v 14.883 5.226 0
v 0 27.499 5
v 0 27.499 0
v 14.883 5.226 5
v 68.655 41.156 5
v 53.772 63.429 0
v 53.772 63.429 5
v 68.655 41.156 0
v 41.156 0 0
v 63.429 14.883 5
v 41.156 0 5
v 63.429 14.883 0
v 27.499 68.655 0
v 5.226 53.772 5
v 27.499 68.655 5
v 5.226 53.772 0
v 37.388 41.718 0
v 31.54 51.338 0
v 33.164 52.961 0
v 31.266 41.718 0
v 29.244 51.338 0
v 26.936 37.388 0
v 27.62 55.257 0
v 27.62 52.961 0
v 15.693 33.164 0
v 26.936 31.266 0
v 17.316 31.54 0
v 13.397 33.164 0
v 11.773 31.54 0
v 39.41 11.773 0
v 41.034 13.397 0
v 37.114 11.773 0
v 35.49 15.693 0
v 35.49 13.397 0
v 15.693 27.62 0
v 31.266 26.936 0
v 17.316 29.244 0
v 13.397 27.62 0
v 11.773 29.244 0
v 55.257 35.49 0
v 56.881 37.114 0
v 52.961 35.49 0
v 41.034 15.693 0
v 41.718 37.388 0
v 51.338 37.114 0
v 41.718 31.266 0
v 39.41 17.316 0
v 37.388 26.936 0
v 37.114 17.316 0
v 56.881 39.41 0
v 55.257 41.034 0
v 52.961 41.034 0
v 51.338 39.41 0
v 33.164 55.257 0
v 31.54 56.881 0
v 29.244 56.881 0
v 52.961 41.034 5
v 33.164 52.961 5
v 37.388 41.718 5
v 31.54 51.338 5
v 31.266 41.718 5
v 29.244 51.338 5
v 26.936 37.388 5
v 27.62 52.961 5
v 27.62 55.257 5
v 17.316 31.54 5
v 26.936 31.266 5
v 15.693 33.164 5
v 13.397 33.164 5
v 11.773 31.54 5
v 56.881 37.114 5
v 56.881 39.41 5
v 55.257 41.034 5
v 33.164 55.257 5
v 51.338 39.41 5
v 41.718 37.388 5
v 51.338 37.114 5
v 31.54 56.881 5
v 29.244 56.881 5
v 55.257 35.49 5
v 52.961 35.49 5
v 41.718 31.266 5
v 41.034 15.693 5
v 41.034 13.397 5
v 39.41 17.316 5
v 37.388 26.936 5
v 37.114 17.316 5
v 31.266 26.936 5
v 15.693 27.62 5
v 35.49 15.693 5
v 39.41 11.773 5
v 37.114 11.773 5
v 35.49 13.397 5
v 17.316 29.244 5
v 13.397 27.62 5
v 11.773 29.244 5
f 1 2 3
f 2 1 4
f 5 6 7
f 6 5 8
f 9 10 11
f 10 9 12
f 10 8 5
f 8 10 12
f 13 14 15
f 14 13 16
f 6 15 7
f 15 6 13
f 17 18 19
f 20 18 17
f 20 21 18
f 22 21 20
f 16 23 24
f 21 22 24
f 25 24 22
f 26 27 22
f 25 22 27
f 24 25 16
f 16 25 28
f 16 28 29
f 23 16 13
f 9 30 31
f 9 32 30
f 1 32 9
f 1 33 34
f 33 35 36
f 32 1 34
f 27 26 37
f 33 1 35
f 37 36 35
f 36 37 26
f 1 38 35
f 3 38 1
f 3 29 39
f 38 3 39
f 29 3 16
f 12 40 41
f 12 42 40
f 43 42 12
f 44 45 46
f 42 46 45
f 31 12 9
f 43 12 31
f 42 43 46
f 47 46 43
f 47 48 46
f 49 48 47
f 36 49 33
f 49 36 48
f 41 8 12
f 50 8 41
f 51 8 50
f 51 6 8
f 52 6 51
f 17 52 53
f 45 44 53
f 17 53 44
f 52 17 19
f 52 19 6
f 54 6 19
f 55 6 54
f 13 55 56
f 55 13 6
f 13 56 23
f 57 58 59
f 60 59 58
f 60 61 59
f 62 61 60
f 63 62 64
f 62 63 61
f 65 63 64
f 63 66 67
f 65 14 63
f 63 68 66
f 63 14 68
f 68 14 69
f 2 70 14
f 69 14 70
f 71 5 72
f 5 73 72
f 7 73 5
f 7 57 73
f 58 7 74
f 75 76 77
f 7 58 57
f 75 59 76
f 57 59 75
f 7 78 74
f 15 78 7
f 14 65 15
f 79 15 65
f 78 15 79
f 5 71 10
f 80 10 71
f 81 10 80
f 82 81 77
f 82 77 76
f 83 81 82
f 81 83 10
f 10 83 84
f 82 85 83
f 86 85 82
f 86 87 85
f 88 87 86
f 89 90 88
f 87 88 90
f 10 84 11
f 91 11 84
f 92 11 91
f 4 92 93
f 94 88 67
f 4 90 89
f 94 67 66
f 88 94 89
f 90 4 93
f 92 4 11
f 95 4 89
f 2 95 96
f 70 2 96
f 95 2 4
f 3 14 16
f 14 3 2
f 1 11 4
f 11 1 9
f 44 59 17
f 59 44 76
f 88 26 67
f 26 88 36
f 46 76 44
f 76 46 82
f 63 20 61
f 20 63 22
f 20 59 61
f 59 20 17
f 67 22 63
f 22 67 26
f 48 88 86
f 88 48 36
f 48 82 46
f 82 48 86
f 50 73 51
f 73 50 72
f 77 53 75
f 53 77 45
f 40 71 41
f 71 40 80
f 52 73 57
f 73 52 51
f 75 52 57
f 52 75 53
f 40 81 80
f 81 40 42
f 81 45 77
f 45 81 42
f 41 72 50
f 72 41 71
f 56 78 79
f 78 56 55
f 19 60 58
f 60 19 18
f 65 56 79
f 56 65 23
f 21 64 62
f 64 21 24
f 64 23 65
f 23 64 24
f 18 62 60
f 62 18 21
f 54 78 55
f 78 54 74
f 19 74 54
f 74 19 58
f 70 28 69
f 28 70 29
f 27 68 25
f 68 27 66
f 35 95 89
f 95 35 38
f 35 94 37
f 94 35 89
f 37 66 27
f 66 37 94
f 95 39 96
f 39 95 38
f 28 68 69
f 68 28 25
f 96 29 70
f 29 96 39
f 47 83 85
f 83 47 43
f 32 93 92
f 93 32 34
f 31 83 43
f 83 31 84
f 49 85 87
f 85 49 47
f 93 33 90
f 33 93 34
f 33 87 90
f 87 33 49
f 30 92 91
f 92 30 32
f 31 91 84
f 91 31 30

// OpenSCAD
$fn = 32;

// ----------------------------------------------------------------------
// Polygon plate: 8-gon R35, 4 bolt windows
// ----------------------------------------------------------------------

// --- parameters (mm) ---
sides = 8;                // number of polygon sides
plate_r = 35;             // circumscribed radius of the polygon
bore_r = 8;               // centre bore radius
bolts = 4;                // number of bolt windows
ring_r = 20.17;           // bolt-circle radius
bolt_r = 3;               // bolt window radius
plate_t = 5;              // plate thickness, Z (extrusion height)

plate_d = 2 * plate_r;  // circumscribed diameter
bore_d = 2 * bore_r;  // centre bore diameter
bolt_d = 2 * bolt_r;  // bolt window diameter
ring_d = 2 * ring_r;  // bolt-circle diameter

profile = [[68.655, 41.156], [53.772, 63.429], [27.499, 68.655], [5.226, 53.772], [0, 27.499], [14.883, 5.226], [41.156, 0], [63.429, 14.883]];  // primary outline, 8 points, counter clockwise
void_1 = [[41.718, 37.388], [37.388, 41.718], [31.266, 41.718], [26.936, 37.388], [26.936, 31.266], [31.266, 26.936], [37.388, 26.936], [41.718, 31.266]];  // centre bore, 8 points
void_2 = [[56.881, 39.41], [55.257, 41.034], [52.961, 41.034], [51.338, 39.41], [51.338, 37.114], [52.961, 35.49], [55.257, 35.49], [56.881, 37.114]];  // bolt window 1, 8 points
void_3 = [[33.164, 55.257], [31.54, 56.881], [29.244, 56.881], [27.62, 55.257], [27.62, 52.961], [29.244, 51.338], [31.54, 51.338], [33.164, 52.961]];  // bolt window 2, 8 points
void_4 = [[17.316, 31.54], [15.693, 33.164], [13.397, 33.164], [11.773, 31.54], [11.773, 29.244], [13.397, 27.62], [15.693, 27.62], [17.316, 29.244]];  // bolt window 3, 8 points
void_5 = [[41.034, 15.693], [39.41, 17.316], [37.114, 17.316], [35.49, 15.693], [35.49, 13.397], [37.114, 11.773], [39.41, 11.773], [41.034, 13.397]];  // bolt window 4, 8 points

// --- the one profile operation ---
difference() {
  linear_extrude(height = plate_t) polygon(points = profile);
  translate([0, 0, -1])
    linear_extrude(height = plate_t + 2) polygon(points = void_1);
  translate([0, 0, -1])
    linear_extrude(height = plate_t + 2) polygon(points = void_2);
  translate([0, 0, -1])
    linear_extrude(height = plate_t + 2) polygon(points = void_3);
  translate([0, 0, -1])
    linear_extrude(height = plate_t + 2) polygon(points = void_4);
  translate([0, 0, -1])
    linear_extrude(height = plate_t + 2) polygon(points = void_5);
}
